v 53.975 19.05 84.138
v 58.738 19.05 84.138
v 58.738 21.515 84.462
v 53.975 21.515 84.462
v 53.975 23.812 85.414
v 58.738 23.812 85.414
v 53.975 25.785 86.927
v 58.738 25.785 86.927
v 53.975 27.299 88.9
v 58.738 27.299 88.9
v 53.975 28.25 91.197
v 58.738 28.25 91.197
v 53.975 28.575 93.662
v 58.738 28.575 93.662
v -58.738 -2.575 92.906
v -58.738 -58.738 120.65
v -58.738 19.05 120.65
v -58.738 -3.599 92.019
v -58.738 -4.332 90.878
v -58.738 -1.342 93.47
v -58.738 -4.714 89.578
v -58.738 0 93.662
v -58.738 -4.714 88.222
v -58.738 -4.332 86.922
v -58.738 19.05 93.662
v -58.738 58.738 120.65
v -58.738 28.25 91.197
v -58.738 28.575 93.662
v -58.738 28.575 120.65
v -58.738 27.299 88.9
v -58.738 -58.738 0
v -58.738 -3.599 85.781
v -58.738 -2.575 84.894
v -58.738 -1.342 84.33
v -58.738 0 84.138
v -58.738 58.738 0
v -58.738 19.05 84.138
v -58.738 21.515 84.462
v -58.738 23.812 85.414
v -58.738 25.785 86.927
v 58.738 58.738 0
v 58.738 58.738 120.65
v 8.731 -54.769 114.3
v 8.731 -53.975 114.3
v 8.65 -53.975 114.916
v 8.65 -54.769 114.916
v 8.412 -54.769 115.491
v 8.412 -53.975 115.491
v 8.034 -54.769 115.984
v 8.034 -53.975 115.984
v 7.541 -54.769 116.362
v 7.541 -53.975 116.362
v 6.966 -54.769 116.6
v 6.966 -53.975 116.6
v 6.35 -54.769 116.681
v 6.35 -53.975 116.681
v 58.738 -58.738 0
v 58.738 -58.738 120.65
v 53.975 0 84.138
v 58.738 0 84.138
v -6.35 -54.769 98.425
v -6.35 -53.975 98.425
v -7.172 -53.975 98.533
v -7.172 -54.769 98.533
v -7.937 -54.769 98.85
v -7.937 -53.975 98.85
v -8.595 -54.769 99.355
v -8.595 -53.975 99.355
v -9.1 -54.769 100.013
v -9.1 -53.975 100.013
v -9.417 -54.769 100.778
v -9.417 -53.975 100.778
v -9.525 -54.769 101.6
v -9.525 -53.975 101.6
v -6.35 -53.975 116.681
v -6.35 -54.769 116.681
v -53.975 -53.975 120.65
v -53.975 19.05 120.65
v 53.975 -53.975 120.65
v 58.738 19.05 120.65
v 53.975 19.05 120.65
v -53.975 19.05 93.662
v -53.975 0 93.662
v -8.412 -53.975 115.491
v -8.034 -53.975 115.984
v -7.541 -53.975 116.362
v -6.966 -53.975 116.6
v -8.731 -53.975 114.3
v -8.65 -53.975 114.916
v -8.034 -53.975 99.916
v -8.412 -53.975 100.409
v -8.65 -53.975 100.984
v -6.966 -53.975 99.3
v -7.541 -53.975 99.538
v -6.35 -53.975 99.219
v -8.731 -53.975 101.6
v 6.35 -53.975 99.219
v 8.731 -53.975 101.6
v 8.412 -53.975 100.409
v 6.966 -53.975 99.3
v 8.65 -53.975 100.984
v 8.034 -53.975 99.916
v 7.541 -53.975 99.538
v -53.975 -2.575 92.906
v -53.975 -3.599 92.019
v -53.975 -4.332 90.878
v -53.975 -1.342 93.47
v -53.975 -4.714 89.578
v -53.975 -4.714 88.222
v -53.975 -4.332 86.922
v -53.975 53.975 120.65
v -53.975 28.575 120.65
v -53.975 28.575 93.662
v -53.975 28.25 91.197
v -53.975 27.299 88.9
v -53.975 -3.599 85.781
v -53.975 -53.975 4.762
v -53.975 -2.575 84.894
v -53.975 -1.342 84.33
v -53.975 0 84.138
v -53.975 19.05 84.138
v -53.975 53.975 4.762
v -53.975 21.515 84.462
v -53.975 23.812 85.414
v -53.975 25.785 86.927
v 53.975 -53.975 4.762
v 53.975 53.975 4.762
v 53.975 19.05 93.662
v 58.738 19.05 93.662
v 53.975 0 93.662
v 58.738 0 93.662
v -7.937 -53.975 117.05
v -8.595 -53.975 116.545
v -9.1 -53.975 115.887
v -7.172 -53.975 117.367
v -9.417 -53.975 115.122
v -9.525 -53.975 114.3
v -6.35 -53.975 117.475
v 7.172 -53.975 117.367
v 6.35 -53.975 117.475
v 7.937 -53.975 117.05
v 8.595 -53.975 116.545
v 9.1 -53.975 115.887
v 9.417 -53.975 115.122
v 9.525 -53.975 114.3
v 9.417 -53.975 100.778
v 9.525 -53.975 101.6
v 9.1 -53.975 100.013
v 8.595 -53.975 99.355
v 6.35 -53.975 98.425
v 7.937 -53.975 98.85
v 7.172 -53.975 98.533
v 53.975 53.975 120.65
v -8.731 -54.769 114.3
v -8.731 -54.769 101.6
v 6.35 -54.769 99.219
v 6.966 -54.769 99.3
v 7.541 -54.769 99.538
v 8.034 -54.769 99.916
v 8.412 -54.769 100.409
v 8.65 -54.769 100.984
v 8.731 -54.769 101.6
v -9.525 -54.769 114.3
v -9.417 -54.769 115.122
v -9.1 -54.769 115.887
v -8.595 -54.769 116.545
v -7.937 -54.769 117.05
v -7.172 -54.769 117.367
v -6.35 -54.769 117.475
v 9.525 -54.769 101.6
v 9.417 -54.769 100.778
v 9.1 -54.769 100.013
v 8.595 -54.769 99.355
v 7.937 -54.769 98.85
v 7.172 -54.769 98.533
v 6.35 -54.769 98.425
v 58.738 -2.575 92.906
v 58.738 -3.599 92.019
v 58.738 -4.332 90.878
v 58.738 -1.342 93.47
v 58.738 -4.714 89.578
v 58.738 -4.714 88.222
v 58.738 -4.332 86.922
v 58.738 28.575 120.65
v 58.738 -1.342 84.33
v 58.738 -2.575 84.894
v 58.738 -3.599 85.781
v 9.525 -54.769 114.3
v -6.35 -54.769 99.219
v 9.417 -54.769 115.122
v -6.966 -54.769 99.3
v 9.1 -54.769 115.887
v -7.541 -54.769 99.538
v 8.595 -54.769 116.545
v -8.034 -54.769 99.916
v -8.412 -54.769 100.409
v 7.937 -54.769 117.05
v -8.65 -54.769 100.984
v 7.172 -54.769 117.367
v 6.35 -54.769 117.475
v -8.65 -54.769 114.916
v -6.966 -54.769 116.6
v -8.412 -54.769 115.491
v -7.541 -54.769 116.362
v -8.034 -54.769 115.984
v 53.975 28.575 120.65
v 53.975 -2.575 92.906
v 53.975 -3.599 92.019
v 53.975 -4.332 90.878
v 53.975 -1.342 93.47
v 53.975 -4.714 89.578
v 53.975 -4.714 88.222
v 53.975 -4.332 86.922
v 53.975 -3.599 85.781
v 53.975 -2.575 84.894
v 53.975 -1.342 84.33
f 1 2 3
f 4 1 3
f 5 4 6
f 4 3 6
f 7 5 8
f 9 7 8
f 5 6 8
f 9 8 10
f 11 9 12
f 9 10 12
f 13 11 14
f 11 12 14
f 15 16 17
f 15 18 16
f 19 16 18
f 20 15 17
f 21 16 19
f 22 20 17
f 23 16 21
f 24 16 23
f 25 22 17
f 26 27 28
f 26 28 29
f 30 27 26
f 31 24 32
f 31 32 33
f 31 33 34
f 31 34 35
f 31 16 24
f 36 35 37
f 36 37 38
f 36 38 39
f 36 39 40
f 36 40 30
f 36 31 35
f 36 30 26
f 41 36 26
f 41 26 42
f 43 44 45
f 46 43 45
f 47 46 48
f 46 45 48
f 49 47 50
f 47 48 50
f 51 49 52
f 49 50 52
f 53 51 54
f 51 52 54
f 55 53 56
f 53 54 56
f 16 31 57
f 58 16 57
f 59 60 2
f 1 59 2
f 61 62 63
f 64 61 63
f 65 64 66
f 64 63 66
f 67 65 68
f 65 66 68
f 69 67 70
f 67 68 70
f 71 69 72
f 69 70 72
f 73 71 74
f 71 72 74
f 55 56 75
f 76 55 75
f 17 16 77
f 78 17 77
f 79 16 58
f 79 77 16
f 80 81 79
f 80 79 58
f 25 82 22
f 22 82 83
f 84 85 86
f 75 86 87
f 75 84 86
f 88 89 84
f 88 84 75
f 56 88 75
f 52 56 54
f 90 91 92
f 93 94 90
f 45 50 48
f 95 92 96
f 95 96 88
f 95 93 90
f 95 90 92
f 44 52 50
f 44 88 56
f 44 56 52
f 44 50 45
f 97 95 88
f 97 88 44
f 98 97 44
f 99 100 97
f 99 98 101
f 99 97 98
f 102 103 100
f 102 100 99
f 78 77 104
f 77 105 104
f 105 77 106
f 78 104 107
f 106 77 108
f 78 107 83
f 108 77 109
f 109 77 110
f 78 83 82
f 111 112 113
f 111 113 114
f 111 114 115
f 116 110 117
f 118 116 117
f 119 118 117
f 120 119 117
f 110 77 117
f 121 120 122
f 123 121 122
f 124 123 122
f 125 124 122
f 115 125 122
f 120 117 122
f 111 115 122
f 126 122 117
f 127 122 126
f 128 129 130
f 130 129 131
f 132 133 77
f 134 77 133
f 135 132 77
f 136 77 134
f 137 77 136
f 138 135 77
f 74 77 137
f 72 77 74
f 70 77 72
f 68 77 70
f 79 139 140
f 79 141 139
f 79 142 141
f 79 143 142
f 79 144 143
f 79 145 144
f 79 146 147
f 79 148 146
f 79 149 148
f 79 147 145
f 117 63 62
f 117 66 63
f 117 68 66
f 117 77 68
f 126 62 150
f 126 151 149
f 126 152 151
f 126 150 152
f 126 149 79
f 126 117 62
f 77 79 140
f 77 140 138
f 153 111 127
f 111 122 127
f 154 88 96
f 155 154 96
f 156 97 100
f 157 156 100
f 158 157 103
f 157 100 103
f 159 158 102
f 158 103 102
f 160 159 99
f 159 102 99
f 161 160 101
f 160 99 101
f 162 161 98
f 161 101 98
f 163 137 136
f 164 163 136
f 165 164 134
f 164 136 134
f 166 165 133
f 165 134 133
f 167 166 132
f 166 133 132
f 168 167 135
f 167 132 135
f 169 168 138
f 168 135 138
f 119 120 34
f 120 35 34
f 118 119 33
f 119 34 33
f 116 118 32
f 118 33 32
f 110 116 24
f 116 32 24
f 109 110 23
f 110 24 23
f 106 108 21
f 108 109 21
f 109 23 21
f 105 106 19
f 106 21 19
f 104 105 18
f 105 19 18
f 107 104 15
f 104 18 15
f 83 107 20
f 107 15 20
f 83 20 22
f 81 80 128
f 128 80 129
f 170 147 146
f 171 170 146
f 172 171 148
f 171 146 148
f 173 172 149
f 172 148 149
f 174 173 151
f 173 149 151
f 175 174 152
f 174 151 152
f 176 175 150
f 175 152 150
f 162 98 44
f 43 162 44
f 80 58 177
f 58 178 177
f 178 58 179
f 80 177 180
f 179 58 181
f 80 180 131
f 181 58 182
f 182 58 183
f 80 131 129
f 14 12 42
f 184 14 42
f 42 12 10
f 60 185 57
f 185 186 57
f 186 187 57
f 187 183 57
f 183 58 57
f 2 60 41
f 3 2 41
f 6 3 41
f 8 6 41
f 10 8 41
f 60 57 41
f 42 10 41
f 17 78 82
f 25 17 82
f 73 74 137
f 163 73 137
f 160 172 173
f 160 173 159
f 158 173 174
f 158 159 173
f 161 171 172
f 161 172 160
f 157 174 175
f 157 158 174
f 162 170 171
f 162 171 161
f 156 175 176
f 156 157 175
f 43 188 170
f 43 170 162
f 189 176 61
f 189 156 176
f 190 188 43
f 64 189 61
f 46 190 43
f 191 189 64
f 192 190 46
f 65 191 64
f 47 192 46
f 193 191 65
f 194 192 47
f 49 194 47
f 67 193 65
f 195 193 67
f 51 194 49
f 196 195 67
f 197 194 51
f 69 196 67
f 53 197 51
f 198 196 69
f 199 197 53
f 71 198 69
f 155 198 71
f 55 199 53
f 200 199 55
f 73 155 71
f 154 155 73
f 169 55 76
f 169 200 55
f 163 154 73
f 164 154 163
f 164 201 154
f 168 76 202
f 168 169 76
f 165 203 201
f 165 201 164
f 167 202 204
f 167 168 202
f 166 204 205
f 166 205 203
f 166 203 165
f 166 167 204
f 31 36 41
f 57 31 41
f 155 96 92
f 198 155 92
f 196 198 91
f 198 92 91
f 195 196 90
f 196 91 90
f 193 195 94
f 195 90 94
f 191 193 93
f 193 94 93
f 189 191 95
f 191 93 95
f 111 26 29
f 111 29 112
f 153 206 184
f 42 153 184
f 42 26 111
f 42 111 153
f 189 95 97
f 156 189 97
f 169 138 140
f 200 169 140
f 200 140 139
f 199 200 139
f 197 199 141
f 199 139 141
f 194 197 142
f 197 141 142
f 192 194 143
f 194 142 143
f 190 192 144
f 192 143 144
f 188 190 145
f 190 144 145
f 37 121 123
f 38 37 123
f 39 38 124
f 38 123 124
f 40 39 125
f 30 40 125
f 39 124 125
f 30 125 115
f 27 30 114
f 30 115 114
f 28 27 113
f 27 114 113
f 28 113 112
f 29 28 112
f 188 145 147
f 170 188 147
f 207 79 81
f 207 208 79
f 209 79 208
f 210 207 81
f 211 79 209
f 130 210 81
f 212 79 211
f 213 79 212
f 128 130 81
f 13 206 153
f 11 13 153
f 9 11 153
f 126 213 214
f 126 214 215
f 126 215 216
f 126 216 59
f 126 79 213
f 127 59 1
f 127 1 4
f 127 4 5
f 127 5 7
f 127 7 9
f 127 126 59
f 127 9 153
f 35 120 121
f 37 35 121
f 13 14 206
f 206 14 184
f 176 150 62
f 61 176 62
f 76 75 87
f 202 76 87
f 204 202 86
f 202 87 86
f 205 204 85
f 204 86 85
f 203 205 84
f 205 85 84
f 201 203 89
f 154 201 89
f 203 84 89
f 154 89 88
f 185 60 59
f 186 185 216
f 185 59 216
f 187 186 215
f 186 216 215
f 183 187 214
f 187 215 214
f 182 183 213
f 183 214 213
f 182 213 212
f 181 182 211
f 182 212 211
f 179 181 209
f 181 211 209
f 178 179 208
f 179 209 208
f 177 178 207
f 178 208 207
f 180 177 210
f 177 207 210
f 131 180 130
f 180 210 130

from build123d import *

# Parameters (mm, degrees)
F0_W     = 117.475
F0_H     = 117.475
F1_DEPTH = 120.65
F2_T     = -4.7625
F4_D     = 9.525
F6_DEPTH = 0.79375
F9_DEPTH = 117.475


with BuildPart() as f1:
    # F0 (on Top) → F1 (new body)
    with BuildSketch(Plane.XY):
        Rectangle(F0_W, F0_H)
    extrude(amount=F1_DEPTH)

    # F2
    f2_openings = [f1.faces().sort_by_distance(p)[0] for p in [
        (0, 0, 120.65),
    ]]
    offset(amount=F2_T, openings=f2_openings)

    # F4 (through all)
    with Locations(Plane.YZ.offset(58.7375)):
        with Locations((0, 88.9)):
            Hole(F4_D / 2)


with BuildPart() as f6:
    # F5 (on face) → F6 (new body)
    with BuildSketch(Plane(origin=(0, -53.975, 0), x_dir=(-1, 0, 0), z_dir=(0, 1, 0))):
        with BuildLine():
            Line((0, 117.475), (-6.35, 117.475))
            ThreePointArc((-6.35, 117.475), (-8.595064, 116.545064), (-9.525, 114.3))
            Line((-9.525, 114.3), (-9.525, 101.6))
            ThreePointArc((-9.525, 101.6), (-8.595064, 99.354936), (-6.35, 98.425))
            Line((-6.35, 98.425), (6.35, 98.425))
            ThreePointArc((6.35, 98.425), (8.595064, 99.354936), (9.525, 101.6))
            Line((9.525, 101.6), (9.525, 114.3))
            ThreePointArc((9.525, 114.3), (8.595064, 116.545064), (6.35, 117.475))
            Line((6.35, 117.475), (0, 117.475))
        make_face()
        with BuildLine():
            Line((-6.35, 116.68125), (0, 116.68125))
            Line((0, 116.68125), (6.35, 116.68125))
            ThreePointArc((6.35, 116.68125), (8.033798, 115.983798), (8.73125, 114.3))
            Line((8.73125, 114.3), (8.73125, 101.6))
            ThreePointArc((8.73125, 101.6), (8.033798, 99.916202), (6.35, 99.21875))
            Line((6.35, 99.21875), (-6.35, 99.21875))
            ThreePointArc((-6.35, 99.21875), (-8.033798, 99.916202), (-8.73125, 101.6))
            Line((-8.73125, 101.6), (-8.73125, 114.3))
            ThreePointArc((-8.73125, 114.3), (-8.033798, 115.983798), (-6.35, 116.68125))
        make_face(mode=Mode.SUBTRACT)
    extrude(amount=-F6_DEPTH)


with BuildPart() as f1_1:
    add(f1.part)

    # F7: cut F6
    add(f6.part, mode=Mode.SUBTRACT)


with BuildPart() as f9:
    # F8 (on face) → F9 (new body, through all)
    with BuildSketch(Plane.YZ.offset(58.7375)):
        with BuildLine():
            ThreePointArc((0, 93.6625), (4.7625, 88.9), (0, 84.1375))
            Line((0, 84.1375), (19.05, 84.1375))
            ThreePointArc((19.05, 84.1375), (25.785192, 86.927308), (28.575, 93.6625))
            Line((28.575, 93.6625), (28.575, 120.65))
            Line((28.575, 120.65), (19.05, 120.65))
            Line((19.05, 120.65), (19.05, 93.6625))
            Line((19.05, 93.6625), (0, 93.6625))
        make_face()
    extrude(amount=-F9_DEPTH)


with BuildPart() as f1_2:
    add(f1_1.part)

    # F10: cut F9
    add(f9.part, mode=Mode.SUBTRACT)


solid = f1_2.part
